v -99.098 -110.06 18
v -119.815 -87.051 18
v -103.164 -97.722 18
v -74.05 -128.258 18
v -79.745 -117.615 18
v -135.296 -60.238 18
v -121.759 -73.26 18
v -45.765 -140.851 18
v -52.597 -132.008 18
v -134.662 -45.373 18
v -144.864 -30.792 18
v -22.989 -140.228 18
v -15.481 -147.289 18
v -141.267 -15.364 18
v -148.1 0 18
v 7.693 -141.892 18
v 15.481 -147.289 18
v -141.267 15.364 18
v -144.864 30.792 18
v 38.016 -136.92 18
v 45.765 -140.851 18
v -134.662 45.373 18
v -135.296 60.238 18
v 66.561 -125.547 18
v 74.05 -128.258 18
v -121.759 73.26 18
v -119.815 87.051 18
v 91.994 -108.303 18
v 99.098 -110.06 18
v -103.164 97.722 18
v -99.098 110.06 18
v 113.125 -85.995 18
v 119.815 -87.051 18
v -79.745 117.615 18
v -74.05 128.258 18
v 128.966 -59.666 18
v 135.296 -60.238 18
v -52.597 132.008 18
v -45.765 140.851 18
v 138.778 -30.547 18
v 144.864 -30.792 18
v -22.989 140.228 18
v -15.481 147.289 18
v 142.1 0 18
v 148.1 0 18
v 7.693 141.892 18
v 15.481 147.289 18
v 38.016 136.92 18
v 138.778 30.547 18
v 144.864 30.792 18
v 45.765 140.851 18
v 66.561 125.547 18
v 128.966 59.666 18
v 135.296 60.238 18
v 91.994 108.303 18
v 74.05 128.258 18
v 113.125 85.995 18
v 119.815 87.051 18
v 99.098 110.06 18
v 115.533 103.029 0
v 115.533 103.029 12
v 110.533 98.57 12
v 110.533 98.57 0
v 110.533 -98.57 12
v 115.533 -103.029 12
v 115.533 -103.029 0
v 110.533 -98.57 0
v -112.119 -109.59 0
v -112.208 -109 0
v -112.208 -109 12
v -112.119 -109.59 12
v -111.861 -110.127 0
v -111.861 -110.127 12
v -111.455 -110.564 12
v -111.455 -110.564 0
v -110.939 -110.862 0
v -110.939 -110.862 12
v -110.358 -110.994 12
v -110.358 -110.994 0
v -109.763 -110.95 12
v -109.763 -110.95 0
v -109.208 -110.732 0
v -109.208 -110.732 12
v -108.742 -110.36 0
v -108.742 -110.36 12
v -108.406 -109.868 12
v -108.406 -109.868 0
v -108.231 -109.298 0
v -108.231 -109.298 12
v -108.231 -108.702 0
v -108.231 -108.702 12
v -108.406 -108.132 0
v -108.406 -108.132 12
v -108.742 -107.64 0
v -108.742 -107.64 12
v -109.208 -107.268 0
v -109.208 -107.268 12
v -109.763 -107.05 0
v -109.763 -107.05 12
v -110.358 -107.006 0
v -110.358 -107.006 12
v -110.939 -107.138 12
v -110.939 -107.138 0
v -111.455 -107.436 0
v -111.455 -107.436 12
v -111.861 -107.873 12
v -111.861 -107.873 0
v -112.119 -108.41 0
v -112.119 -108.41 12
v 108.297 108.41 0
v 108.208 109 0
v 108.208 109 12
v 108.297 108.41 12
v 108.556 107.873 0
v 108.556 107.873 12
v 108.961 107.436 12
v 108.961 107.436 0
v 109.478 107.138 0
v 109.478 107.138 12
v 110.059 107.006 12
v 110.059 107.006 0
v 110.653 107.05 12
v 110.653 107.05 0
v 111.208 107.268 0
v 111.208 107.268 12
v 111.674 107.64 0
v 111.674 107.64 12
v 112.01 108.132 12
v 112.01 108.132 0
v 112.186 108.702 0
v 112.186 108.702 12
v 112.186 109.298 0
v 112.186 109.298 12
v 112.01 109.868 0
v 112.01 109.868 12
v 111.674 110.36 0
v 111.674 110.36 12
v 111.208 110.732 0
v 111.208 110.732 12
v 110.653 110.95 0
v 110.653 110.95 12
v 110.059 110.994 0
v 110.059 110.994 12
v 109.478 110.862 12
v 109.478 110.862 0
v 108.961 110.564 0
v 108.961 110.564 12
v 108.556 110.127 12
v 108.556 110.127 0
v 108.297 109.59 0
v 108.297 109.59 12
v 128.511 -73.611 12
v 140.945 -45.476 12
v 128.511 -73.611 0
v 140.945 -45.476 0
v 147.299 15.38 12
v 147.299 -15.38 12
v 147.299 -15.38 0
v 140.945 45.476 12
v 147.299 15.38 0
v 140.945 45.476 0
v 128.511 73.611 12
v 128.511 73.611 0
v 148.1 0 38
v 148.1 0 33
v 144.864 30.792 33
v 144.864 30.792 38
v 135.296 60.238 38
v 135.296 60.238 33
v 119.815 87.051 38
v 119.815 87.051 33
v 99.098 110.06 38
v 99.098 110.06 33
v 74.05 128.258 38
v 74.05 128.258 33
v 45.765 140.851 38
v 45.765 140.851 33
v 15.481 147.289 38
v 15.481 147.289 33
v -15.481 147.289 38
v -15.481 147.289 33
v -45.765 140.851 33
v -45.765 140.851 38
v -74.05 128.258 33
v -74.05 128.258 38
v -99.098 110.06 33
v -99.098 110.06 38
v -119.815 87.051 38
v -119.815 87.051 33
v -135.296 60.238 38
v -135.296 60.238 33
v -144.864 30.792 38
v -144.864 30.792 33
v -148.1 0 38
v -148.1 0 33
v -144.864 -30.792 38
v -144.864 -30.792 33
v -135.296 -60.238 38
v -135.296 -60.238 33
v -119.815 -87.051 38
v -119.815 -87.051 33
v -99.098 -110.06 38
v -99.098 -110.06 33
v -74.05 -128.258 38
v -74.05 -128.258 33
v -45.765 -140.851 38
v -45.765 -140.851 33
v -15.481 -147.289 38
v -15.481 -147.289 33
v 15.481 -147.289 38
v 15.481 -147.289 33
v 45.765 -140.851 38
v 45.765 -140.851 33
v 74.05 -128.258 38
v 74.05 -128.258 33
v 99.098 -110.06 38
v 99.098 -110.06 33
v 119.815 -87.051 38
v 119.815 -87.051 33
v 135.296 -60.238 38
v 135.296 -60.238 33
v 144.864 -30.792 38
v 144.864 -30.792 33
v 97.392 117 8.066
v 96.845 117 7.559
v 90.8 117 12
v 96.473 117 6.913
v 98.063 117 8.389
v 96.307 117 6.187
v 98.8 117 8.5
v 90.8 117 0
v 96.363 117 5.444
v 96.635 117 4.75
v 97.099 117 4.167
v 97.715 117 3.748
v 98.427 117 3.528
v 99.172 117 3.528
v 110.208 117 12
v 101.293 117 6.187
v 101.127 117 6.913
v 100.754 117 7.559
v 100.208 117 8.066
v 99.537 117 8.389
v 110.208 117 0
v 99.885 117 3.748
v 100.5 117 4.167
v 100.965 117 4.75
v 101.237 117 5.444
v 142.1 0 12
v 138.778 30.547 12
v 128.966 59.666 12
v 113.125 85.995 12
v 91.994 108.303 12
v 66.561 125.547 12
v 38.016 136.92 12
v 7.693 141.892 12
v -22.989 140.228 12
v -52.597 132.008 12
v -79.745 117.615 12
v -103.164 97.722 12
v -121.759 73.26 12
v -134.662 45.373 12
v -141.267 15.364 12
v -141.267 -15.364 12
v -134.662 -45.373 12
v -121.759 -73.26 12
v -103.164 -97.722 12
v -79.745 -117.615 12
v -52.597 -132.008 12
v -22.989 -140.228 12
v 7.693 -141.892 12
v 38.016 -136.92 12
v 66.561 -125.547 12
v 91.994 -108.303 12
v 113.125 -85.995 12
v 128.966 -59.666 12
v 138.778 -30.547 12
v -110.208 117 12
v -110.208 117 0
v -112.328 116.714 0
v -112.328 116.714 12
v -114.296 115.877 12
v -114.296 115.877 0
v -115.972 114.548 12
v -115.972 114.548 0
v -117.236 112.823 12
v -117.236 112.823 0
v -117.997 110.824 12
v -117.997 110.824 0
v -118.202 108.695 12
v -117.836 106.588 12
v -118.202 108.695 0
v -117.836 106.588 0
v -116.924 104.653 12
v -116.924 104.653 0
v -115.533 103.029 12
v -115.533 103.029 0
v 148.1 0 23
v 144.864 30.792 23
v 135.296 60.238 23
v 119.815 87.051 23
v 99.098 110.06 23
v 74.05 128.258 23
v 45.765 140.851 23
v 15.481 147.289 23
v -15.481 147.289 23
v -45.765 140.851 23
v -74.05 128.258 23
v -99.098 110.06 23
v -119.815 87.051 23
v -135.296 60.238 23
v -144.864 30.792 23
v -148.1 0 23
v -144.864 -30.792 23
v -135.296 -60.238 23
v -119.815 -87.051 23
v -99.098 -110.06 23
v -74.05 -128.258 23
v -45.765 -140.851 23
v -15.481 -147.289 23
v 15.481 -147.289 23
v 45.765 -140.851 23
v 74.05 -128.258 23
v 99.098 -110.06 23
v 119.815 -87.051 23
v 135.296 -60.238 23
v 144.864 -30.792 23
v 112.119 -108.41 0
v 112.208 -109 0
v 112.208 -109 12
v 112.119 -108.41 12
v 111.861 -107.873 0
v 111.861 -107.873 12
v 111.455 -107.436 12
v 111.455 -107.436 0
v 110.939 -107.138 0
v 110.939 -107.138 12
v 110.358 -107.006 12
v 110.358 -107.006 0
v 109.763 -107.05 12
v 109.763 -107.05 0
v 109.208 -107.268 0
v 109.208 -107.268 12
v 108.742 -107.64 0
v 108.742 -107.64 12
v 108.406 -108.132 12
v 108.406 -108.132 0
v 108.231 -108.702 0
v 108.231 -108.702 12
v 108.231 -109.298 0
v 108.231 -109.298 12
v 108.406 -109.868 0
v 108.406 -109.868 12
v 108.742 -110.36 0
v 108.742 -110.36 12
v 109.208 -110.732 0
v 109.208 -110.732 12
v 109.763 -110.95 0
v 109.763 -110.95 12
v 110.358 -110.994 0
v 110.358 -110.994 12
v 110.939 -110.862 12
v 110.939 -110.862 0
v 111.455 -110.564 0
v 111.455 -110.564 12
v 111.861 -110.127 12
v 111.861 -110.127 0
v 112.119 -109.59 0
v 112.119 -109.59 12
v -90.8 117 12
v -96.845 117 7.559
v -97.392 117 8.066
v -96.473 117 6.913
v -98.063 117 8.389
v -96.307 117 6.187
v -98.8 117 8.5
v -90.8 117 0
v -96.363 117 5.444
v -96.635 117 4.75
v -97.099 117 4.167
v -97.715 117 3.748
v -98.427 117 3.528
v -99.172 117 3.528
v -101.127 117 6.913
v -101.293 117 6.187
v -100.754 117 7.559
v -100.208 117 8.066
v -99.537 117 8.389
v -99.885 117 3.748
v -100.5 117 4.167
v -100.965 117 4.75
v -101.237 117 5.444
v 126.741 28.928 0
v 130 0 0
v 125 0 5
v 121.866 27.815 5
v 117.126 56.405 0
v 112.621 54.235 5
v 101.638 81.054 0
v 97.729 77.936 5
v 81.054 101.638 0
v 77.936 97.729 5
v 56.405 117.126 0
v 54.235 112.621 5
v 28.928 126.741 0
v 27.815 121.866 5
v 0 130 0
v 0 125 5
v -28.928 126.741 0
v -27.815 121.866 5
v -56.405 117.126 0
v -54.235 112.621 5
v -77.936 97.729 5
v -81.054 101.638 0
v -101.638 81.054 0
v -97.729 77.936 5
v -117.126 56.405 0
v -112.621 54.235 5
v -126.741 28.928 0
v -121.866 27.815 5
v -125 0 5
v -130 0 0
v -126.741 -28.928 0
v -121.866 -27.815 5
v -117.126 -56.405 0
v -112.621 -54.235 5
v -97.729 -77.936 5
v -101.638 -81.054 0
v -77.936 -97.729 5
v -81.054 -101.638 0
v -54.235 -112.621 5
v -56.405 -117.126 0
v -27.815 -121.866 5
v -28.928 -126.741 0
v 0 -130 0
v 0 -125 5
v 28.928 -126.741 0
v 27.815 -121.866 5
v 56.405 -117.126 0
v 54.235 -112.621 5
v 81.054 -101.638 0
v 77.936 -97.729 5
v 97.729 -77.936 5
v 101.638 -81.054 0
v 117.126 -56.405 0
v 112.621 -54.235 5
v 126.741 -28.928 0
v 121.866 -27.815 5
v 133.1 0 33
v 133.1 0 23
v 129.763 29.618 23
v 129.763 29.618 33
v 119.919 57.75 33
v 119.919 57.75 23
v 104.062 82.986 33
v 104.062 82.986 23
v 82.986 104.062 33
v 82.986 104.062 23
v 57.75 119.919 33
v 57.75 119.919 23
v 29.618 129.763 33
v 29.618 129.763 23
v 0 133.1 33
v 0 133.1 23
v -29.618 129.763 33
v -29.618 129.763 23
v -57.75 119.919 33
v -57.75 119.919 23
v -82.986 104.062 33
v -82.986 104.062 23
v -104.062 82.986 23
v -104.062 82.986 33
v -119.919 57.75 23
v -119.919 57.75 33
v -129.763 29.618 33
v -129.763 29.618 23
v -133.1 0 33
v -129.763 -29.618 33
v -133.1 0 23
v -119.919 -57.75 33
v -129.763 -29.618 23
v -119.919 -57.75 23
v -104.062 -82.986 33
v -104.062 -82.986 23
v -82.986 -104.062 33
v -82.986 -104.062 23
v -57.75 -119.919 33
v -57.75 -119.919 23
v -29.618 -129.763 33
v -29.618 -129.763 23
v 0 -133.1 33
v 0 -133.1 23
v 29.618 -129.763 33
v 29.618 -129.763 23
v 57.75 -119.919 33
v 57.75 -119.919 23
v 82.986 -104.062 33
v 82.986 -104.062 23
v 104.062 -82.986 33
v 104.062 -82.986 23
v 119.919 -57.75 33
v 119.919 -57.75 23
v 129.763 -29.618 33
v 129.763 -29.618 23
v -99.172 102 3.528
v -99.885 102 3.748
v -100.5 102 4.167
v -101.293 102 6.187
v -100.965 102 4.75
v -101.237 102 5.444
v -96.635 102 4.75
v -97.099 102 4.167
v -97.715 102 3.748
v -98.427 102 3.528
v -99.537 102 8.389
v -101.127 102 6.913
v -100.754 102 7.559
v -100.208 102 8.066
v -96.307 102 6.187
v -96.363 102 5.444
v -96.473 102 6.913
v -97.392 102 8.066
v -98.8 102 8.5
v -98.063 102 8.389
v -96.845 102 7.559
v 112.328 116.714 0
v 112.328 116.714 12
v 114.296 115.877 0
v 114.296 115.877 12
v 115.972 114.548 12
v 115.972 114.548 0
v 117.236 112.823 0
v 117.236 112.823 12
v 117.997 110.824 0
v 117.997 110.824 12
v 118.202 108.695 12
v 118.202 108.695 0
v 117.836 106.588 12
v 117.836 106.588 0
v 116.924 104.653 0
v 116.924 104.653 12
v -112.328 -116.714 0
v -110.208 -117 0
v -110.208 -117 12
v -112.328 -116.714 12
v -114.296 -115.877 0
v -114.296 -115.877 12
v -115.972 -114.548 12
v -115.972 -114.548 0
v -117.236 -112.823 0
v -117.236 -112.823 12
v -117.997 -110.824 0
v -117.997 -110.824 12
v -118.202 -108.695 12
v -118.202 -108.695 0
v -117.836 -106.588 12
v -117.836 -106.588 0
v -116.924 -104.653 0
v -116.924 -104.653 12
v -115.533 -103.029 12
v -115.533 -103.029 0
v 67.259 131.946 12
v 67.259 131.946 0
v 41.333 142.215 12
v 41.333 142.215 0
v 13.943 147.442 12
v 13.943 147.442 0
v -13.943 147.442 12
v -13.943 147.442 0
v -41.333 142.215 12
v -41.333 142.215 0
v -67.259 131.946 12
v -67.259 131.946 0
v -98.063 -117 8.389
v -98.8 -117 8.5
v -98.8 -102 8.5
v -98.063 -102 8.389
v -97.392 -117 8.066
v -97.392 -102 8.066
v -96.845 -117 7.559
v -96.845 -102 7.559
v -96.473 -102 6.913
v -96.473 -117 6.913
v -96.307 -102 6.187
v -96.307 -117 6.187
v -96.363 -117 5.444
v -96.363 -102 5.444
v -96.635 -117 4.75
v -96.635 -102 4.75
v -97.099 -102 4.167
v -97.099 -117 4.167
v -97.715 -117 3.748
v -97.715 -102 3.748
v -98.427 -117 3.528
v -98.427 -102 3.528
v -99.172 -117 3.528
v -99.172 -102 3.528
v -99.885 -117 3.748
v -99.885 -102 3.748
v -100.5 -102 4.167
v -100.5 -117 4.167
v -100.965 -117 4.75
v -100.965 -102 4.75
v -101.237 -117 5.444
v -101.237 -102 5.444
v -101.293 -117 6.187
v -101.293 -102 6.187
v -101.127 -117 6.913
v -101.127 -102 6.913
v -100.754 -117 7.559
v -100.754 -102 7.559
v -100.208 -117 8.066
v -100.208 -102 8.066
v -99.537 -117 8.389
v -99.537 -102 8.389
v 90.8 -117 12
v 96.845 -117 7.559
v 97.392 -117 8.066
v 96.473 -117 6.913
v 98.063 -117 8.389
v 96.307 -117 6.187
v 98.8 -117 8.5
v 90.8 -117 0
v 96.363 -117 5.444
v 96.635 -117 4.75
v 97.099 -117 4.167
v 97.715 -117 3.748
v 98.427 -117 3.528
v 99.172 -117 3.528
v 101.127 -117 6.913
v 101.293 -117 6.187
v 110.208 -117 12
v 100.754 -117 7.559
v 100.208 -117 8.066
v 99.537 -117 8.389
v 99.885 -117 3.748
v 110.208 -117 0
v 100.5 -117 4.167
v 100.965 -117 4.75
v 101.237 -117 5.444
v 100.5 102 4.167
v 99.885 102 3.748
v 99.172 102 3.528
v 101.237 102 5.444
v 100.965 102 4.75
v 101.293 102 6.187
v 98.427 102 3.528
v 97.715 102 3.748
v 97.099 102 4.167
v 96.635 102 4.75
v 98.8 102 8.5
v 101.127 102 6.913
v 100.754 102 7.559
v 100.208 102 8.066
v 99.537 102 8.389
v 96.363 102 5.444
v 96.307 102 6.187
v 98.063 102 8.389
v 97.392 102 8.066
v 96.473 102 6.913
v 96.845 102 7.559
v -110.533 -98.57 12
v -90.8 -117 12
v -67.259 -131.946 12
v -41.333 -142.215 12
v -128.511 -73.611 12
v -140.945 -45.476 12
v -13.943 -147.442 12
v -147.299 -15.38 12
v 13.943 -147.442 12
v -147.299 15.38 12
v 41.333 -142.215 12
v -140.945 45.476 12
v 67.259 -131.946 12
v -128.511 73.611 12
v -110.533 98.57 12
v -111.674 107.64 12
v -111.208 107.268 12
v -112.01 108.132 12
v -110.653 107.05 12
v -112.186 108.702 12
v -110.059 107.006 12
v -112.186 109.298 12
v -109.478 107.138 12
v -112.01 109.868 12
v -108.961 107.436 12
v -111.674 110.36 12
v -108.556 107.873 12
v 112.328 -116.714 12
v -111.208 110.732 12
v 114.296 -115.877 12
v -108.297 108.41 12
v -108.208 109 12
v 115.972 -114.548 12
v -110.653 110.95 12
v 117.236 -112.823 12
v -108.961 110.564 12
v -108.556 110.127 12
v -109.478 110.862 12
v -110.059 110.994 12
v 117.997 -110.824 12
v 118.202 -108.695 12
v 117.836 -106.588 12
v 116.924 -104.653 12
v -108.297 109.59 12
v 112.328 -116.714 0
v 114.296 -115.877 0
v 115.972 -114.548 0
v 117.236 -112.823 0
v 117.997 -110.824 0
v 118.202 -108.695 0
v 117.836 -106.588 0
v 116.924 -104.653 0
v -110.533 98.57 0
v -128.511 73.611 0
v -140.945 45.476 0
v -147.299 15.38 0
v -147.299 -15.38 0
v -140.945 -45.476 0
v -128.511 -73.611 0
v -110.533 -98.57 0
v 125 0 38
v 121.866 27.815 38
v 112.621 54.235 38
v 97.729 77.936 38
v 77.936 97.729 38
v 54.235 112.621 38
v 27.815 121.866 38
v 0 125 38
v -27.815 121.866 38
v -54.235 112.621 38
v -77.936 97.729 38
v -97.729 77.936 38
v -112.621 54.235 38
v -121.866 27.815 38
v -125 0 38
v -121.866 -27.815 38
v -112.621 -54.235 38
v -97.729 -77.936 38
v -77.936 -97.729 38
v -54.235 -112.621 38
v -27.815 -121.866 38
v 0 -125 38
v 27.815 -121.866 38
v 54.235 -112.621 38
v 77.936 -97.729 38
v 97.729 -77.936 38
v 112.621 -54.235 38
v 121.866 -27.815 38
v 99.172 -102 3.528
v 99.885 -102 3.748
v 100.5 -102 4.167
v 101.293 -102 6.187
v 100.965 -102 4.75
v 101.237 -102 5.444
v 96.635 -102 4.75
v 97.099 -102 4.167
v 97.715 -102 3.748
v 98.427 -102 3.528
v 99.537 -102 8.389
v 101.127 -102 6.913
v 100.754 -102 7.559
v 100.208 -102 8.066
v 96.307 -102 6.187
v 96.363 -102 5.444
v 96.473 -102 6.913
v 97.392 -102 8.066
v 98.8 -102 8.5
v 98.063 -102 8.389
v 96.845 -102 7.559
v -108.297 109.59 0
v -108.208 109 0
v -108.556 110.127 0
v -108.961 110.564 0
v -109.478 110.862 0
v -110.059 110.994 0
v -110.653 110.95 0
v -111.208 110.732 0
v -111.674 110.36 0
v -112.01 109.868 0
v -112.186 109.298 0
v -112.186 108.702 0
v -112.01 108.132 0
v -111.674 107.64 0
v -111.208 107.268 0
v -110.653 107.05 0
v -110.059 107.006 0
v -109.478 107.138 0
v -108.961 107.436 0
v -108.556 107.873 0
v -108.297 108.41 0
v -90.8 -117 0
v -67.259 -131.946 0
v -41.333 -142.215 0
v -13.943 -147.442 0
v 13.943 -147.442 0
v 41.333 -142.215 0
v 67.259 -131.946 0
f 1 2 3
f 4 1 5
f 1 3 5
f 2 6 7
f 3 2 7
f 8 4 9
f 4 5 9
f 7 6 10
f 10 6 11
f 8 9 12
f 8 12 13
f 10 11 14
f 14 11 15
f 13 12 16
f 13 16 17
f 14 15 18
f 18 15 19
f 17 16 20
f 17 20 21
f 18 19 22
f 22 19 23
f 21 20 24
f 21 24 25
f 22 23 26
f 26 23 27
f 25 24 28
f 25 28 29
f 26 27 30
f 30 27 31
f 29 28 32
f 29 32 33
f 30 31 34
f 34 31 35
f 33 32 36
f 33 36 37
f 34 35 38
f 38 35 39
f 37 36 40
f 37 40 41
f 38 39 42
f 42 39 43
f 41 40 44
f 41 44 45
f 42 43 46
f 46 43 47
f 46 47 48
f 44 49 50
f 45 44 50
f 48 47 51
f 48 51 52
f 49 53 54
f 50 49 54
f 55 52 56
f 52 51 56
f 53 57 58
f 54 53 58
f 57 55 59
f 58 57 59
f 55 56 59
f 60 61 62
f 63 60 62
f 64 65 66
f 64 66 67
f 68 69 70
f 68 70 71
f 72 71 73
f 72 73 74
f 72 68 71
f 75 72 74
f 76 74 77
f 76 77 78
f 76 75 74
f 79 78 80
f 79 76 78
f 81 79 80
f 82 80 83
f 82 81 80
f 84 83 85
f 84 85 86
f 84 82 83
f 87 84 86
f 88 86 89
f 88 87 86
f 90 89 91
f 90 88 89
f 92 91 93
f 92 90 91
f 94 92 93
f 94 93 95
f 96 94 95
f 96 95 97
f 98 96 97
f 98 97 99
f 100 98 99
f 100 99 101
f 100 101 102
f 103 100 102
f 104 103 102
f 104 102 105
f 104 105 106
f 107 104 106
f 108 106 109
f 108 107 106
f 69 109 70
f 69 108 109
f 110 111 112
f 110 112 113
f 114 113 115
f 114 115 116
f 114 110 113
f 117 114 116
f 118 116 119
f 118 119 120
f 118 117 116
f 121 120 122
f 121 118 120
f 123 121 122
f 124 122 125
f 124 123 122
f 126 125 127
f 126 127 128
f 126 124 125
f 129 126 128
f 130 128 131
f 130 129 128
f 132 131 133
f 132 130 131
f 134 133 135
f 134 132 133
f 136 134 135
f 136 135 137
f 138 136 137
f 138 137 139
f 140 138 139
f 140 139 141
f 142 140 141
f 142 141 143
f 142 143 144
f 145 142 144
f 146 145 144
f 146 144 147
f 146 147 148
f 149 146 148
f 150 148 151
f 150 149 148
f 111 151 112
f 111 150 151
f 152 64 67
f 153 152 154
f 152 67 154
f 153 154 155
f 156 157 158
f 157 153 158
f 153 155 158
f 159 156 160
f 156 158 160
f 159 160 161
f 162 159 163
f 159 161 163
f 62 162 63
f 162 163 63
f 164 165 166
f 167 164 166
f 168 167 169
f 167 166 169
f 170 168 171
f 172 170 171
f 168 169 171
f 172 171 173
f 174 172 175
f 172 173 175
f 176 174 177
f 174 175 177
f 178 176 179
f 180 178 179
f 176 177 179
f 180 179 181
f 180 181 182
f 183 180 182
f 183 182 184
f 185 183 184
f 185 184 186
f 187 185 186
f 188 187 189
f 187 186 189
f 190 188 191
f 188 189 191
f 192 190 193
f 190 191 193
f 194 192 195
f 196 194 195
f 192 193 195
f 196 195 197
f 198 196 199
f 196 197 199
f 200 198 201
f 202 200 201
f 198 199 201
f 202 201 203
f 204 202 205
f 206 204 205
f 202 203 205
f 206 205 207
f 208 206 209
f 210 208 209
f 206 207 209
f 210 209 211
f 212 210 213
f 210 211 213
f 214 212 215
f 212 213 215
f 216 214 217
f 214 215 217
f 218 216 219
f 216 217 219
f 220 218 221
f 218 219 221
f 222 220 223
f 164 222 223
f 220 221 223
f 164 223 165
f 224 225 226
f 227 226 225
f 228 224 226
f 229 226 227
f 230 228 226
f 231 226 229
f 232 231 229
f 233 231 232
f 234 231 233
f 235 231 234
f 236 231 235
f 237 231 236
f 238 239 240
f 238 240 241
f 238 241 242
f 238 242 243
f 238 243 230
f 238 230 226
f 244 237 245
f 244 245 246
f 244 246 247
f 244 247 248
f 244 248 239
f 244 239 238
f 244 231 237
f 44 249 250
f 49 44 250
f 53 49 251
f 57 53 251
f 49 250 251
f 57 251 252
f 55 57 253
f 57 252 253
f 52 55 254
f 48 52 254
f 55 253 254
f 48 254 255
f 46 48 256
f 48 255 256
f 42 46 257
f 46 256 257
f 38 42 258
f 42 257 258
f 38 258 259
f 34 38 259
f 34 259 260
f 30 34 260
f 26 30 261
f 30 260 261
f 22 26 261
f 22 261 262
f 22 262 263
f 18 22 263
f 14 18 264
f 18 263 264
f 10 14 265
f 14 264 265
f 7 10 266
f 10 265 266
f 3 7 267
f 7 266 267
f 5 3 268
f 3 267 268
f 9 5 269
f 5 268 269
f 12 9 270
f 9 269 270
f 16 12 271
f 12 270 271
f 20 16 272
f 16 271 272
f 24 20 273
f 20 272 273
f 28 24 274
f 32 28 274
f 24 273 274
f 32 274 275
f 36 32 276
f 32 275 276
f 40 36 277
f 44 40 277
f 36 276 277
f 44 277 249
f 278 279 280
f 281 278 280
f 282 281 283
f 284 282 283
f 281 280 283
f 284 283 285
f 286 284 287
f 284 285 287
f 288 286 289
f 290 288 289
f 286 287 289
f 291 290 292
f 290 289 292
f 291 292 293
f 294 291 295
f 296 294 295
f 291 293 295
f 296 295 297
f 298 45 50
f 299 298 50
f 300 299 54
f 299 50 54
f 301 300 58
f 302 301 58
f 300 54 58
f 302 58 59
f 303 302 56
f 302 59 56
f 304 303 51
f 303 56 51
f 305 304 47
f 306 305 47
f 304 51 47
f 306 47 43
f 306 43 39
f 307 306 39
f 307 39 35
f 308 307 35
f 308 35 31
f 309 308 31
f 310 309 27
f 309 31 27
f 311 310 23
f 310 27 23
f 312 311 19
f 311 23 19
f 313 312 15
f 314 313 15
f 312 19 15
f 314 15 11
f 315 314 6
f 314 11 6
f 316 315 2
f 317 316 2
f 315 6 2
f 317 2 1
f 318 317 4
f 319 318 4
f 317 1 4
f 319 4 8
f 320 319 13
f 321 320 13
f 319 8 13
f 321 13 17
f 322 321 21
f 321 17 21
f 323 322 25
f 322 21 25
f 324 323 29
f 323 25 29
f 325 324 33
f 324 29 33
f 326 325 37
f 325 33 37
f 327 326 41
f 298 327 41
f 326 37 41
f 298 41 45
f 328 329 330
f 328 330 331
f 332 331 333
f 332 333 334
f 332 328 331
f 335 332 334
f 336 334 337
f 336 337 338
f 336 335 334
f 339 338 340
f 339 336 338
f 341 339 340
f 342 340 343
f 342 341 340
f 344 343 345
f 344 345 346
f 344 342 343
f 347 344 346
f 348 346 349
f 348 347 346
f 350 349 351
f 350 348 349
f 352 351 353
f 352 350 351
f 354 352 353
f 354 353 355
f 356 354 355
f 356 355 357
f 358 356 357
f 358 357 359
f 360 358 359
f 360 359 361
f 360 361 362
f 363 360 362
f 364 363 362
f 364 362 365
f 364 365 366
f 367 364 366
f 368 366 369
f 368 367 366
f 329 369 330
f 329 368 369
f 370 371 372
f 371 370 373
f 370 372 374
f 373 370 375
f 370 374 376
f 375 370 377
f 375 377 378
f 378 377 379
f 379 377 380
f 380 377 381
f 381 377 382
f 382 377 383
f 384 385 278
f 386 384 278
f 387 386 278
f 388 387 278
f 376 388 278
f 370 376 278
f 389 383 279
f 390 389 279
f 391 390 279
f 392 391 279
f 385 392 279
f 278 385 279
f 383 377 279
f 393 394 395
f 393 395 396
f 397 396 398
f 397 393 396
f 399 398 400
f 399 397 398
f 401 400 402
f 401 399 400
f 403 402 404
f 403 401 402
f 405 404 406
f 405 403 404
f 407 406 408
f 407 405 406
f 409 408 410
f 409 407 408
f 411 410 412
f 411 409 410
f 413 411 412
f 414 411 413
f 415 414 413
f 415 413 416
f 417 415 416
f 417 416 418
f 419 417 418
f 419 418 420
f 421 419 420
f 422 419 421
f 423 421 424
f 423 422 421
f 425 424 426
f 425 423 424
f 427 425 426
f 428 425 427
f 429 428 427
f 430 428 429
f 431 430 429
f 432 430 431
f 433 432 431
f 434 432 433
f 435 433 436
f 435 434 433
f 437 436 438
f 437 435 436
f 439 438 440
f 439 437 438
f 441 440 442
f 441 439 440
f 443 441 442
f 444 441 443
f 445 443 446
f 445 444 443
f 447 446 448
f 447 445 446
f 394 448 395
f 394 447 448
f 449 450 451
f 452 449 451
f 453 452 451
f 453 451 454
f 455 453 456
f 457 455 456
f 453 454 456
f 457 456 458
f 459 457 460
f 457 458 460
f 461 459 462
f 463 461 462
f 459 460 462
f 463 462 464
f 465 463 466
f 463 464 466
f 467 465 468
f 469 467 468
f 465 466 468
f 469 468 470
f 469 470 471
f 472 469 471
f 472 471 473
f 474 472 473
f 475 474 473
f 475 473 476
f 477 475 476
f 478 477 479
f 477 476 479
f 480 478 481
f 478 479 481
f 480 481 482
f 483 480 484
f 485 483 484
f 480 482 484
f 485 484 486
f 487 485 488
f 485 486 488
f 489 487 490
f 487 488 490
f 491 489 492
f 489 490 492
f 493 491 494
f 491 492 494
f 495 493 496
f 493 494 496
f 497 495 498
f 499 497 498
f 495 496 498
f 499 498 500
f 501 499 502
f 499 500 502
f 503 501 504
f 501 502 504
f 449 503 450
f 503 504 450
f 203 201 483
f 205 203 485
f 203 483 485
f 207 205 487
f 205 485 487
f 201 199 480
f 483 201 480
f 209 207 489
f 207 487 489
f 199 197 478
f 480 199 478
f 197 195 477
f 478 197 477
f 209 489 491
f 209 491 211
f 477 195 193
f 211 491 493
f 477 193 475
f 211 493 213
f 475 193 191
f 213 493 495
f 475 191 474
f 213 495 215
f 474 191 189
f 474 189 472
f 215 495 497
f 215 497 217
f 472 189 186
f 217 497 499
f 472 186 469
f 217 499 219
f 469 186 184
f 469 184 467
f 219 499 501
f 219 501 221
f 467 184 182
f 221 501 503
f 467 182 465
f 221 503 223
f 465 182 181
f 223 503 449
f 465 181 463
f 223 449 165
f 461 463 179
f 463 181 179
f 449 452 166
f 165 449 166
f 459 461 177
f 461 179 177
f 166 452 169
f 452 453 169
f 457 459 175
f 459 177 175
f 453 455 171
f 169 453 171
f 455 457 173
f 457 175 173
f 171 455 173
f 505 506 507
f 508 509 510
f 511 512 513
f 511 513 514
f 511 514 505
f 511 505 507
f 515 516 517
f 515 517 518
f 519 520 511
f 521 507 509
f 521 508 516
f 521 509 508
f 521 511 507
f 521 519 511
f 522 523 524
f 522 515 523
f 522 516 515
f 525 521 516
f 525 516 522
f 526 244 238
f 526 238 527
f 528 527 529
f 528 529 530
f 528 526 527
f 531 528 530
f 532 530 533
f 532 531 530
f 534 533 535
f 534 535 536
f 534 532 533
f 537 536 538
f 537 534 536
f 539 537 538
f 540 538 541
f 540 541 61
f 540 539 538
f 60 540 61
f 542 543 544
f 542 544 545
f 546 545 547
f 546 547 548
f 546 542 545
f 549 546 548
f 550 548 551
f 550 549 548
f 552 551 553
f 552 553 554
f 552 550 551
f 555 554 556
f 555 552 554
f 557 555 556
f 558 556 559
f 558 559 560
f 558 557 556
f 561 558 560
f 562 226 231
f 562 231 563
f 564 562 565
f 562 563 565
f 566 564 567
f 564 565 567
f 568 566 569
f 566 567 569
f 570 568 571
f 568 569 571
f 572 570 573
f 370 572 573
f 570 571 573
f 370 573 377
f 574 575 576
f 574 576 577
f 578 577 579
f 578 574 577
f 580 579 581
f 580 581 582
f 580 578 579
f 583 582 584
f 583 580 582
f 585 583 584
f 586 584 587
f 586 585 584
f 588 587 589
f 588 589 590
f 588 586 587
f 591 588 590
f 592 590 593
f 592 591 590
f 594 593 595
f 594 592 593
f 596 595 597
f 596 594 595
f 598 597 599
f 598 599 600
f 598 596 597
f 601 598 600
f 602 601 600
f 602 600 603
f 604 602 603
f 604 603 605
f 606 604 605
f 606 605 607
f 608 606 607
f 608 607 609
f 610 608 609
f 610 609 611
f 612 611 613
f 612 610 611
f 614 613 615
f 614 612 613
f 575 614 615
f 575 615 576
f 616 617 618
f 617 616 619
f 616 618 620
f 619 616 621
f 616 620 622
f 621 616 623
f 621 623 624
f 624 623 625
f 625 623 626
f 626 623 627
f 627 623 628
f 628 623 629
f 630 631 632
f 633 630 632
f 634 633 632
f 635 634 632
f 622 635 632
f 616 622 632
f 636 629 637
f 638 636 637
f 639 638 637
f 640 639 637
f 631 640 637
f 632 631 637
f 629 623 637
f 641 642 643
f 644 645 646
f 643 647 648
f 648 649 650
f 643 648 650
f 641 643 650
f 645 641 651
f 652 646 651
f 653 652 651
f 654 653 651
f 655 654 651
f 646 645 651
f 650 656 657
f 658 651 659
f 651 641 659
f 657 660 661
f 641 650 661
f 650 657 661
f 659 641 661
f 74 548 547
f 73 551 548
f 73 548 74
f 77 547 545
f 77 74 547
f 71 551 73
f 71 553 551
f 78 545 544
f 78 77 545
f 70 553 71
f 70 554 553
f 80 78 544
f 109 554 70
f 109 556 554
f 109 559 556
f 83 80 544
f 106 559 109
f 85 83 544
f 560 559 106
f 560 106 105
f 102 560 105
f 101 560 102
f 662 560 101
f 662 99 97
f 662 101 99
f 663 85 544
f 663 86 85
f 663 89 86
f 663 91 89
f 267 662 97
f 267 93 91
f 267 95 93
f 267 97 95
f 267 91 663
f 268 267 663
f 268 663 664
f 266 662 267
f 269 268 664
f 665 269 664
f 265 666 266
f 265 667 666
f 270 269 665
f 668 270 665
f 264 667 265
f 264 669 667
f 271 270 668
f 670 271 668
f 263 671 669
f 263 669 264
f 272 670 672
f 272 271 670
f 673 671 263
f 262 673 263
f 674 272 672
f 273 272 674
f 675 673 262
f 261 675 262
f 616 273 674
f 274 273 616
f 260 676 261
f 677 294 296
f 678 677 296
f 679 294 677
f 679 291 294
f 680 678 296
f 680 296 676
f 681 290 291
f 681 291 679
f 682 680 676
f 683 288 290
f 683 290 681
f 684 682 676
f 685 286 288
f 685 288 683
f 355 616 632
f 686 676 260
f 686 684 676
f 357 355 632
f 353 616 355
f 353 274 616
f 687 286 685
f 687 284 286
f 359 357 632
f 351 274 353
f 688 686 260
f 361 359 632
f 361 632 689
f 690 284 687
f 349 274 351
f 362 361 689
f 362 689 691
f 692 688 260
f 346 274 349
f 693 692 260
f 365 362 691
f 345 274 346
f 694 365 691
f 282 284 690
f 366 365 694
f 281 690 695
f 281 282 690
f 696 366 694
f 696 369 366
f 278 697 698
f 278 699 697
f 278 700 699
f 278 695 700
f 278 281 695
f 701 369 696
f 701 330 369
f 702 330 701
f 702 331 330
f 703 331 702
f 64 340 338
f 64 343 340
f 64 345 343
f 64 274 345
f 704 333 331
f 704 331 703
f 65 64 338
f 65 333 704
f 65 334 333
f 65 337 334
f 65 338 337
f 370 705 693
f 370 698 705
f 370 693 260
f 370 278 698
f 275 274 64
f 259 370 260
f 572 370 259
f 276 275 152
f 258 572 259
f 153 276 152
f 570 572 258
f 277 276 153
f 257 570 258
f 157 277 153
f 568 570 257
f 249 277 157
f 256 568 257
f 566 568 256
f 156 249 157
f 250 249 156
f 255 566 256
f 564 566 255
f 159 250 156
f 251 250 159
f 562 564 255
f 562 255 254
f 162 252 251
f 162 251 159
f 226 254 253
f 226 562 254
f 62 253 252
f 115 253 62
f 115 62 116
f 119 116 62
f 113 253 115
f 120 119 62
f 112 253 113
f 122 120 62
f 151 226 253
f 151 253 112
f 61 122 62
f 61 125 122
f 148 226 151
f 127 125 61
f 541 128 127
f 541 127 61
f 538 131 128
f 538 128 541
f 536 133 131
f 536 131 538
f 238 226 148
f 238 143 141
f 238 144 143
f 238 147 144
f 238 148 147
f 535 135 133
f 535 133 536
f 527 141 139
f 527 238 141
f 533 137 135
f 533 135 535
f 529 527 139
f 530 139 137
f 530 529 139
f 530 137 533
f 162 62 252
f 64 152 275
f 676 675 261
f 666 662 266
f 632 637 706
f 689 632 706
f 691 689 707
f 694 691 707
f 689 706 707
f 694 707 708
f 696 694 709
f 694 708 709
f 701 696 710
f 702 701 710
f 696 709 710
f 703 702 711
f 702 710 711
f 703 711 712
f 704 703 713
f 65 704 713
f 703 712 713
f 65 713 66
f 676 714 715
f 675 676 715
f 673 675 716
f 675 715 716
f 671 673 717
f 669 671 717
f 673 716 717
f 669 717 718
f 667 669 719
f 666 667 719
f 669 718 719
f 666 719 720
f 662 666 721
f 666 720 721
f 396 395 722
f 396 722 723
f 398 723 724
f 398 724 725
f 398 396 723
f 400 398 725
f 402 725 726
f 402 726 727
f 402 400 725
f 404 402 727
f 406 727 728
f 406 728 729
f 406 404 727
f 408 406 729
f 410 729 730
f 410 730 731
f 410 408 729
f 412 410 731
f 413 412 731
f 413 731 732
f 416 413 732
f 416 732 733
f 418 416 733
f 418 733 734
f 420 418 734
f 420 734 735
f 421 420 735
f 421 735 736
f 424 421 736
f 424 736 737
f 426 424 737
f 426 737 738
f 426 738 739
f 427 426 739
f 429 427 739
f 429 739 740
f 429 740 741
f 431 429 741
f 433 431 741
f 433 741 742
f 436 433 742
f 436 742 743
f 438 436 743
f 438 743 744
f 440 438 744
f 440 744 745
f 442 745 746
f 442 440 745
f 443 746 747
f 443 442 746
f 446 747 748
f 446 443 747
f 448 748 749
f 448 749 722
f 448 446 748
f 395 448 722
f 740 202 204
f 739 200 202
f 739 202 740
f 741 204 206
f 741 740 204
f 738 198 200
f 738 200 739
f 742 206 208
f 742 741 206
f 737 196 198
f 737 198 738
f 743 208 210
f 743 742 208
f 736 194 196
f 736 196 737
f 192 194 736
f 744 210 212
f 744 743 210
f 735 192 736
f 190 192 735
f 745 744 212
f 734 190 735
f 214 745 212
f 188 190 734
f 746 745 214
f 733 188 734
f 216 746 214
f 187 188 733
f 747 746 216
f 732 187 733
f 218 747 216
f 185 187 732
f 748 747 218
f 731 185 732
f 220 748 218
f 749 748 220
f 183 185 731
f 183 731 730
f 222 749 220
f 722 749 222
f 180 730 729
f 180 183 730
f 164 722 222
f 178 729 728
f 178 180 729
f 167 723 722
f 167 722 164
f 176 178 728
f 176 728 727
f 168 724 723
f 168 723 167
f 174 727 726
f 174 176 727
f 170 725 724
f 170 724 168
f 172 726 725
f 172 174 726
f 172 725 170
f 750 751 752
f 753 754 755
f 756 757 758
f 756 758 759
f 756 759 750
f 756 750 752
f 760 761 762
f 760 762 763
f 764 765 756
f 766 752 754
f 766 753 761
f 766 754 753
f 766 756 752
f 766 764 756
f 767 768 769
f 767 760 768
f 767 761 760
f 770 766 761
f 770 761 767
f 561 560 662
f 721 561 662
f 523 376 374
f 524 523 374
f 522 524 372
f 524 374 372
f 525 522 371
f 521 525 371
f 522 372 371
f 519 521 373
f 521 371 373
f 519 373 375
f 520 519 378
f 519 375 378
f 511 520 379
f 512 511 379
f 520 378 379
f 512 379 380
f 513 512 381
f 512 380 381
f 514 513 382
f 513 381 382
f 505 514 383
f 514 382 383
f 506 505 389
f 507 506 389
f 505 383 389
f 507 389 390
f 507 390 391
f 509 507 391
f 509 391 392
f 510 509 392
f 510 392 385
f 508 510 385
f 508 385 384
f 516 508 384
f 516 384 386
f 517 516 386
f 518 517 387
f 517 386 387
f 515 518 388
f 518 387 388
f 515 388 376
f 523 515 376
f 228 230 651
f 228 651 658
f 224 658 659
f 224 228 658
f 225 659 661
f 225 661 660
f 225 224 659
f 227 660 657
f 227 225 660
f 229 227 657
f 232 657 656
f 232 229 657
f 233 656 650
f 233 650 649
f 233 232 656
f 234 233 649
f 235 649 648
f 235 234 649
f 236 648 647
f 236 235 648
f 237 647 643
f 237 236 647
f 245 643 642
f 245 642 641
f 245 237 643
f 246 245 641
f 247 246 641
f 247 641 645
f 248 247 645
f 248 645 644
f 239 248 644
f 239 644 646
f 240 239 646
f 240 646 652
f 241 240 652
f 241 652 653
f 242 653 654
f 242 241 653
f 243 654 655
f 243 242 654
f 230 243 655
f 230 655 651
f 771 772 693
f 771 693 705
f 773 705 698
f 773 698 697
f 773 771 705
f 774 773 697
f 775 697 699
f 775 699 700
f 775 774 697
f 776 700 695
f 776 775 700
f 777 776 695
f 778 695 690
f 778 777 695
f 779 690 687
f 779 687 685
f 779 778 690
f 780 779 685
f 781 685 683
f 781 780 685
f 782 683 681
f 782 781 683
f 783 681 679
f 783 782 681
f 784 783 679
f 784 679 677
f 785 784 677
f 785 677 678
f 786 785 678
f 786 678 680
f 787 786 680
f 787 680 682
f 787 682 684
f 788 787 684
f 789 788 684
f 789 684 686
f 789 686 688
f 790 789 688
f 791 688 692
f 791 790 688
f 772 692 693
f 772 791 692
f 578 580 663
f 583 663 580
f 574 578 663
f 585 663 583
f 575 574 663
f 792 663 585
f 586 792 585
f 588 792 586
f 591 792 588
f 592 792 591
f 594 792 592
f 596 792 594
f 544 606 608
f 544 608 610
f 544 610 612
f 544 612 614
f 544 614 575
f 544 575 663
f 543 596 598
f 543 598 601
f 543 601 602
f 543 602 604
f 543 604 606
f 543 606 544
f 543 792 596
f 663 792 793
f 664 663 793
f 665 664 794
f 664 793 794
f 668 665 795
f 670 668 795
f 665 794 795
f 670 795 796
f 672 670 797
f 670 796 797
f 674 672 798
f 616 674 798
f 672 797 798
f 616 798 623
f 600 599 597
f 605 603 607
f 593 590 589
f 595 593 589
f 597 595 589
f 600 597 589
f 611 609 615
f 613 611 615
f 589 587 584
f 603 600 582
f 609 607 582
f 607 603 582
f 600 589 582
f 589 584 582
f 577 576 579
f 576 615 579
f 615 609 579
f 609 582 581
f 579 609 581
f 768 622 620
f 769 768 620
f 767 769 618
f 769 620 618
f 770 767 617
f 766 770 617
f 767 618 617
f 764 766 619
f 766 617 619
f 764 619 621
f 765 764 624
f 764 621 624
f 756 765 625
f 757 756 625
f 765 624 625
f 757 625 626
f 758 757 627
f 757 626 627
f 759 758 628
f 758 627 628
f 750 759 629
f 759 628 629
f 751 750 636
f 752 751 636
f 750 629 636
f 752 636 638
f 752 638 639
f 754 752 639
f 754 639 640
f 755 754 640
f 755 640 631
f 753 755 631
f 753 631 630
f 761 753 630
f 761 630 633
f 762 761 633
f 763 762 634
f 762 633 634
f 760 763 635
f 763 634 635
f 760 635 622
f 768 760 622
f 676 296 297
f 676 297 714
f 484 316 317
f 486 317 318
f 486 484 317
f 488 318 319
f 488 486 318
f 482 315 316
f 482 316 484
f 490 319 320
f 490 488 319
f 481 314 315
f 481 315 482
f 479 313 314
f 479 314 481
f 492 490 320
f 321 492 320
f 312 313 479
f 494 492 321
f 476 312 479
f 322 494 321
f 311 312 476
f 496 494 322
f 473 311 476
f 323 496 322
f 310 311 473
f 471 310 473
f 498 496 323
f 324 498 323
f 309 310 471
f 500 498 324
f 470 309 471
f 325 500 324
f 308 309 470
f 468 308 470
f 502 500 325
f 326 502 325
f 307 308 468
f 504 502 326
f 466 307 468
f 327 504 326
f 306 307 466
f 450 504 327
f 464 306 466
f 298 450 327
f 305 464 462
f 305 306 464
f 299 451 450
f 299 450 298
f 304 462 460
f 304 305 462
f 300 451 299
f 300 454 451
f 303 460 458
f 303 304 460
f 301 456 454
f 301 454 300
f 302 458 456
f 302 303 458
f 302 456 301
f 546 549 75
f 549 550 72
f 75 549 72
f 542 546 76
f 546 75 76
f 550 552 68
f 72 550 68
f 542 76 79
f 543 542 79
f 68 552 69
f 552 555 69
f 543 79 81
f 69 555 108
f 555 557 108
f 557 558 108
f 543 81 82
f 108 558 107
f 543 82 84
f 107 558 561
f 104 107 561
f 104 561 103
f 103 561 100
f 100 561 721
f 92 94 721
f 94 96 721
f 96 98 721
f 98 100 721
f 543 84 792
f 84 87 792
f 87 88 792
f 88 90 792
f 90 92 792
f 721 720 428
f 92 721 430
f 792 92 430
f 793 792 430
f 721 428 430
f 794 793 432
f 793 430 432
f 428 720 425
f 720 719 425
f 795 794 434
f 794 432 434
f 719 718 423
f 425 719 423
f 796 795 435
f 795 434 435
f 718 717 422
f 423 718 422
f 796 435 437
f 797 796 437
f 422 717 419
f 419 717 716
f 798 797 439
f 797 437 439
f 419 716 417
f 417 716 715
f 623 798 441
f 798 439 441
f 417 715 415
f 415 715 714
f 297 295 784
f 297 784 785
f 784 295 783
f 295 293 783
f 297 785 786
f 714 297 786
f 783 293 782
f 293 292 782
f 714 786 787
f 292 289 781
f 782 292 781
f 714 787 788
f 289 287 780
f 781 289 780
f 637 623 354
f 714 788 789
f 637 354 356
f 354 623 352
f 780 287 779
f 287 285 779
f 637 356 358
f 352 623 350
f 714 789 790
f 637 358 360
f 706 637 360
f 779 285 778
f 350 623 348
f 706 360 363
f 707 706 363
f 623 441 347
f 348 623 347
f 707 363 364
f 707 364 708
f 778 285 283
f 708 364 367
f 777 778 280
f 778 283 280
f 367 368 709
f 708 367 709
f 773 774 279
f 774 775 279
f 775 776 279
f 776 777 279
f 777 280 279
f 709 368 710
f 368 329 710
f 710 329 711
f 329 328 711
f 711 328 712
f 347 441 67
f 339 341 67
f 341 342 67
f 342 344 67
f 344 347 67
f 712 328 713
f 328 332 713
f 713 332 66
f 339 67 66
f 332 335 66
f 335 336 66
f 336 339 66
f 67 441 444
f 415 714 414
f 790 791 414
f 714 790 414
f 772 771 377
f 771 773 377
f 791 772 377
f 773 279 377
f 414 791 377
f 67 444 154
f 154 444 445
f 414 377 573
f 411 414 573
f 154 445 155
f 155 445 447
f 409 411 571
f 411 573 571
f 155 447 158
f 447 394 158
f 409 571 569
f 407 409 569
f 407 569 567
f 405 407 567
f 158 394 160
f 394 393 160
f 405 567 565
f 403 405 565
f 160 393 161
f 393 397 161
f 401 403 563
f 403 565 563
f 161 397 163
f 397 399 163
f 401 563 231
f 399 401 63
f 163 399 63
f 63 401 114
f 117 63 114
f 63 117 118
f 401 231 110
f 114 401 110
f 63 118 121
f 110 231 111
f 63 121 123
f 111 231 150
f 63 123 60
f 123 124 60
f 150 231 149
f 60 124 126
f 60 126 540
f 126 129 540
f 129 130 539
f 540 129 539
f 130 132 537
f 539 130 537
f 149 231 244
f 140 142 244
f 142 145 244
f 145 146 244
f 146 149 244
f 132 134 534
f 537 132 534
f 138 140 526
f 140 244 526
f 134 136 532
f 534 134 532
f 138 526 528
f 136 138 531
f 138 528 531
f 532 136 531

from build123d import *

# Parameters (mm, degrees)
SKETCH_1_R               = 148.1
SKETCH_1_R_2             = 125
EXTRUDE_1_DEPTH          = 12
SKETCH_2_R               = 142.1
SKETCH_2_R_2             = 125
EXTRUDE_2_DEPTH          = 6
SKETCH_3_R               = 148.1
SKETCH_3_R_2             = 125
EXTRUDE_3_DEPTH          = 5
SKETCH_4_R               = 133.1
SKETCH_4_R_2             = 125
EXTRUDE_4_DEPTH          = 10
SKETCH_5_R               = 148.1
SKETCH_5_R_2             = 125
EXTRUDE_5_DEPTH          = 5
SKETCH_6_R               = 2
EXTRUDE_6_DEPTH          = 12
SKETCH_7_R               = 2.5
CUT_EXTRUDE_1_DEPTH      = 15
MIRROR_2_COPY_1_SKETCH_R = 2.5
MIRROR_2_COPY_1_DEPTH    = 15
CHAMFER_1_SIZE           = 5


with BuildPart() as part:
    # 草图1 → 凸台-拉伸1 (new body)
    with BuildSketch(Plane.XY):
        Circle(SKETCH_1_R)
        Circle(SKETCH_1_R_2, mode=Mode.SUBTRACT)
    extrude(amount=EXTRUDE_1_DEPTH)

    # 草图2 → 凸台-拉伸2 (add)
    with BuildSketch(Plane.XY.offset(12)):
        Circle(SKETCH_2_R)
        Circle(SKETCH_2_R_2, mode=Mode.SUBTRACT)
    extrude(amount=EXTRUDE_2_DEPTH)

    # 草图3 → 凸台-拉伸3 (add)
    with BuildSketch(Plane.XY.offset(18)):
        Circle(SKETCH_3_R)
        Circle(SKETCH_3_R_2, mode=Mode.SUBTRACT)
    extrude(amount=EXTRUDE_3_DEPTH)

    # 草图4 → 凸台-拉伸4 (add)
    with BuildSketch(Plane.XY.offset(23)):
        Circle(SKETCH_4_R)
        Circle(SKETCH_4_R_2, mode=Mode.SUBTRACT)
    extrude(amount=EXTRUDE_4_DEPTH)

    # 草图5 → 凸台-拉伸5 (add)
    with BuildSketch(Plane.XY.offset(33)):
        Circle(SKETCH_5_R)
        Circle(SKETCH_5_R_2, mode=Mode.SUBTRACT)
    extrude(amount=EXTRUDE_5_DEPTH)

    # 草图6 → 凸台-拉伸6 (add)
    # profile 1 of 4: a face of its own
    with BuildSketch(Plane.XY):
        with BuildLine():
            Line((-90.799834802, 117), (-110.208193805, 117))
            ThreePointArc((-110.208193805, 117), (-117.683675787, 111.849064607), (-115.532726589, 103.029292284))
            Line((-115.532726589, 103.029292284), (-110.532726589, 98.570413171))
            ThreePointArc((-110.532726589, 98.570413171), (-101.087152926, 108.235842092), (-90.799834802, 117))
        make_face()
        with Locations((-110.208193805, 109)):
            Circle(SKETCH_6_R, mode=Mode.SUBTRACT)
    # profile 2 of 4: a face of its own
    with BuildSketch(Plane.XY):
        with BuildLine():
            Line((115.532726589, 103.029292284), (110.532726589, 98.570413171))
            ThreePointArc((110.532726589, 98.570413171), (101.087152926, 108.235842092), (90.799834802, 117))
            Line((90.799834802, 117), (110.208193805, 117))
            ThreePointArc((110.208193805, 117), (117.683675787, 111.849064607), (115.532726589, 103.029292284))
        make_face()
        with Locations(Location((110.208193805, 109, 0), (0, 0, 180))):
            Circle(SKETCH_6_R, mode=Mode.SUBTRACT)
    # profile 3 of 4: a face of its own
    with BuildSketch(Plane.XY):
        with BuildLine():
            Line((115.532726589, -103.029292284), (110.532726589, -98.570413171))
            ThreePointArc((110.532726589, -98.570413171), (101.087152926, -108.235842092), (90.799834802, -117))
            Line((90.799834802, -117), (110.208193805, -117))
            ThreePointArc((110.208193805, -117), (117.683675787, -111.849064607), (115.532726589, -103.029292284))
        make_face()
        with Locations((110.208193805, -109)):
            Circle(SKETCH_6_R, mode=Mode.SUBTRACT)
    # profile 4 of 4: a face of its own
    with BuildSketch(Plane.XY):
        with BuildLine():
            Line((-115.532726589, -103.029292284), (-110.532726589, -98.570413171))
            ThreePointArc((-110.532726589, -98.570413171), (-101.087152926, -108.235842092), (-90.799834802, -117))
            Line((-90.799834802, -117), (-110.208193805, -117))
            ThreePointArc((-110.208193805, -117), (-117.683675787, -111.849064607), (-115.532726589, -103.029292284))
        make_face()
        with Locations(Location((-110.208193805, -109, 0), (0, 0, 180))):
            Circle(SKETCH_6_R, mode=Mode.SUBTRACT)
    extrude(amount=EXTRUDE_6_DEPTH)

    # 草图7 → 切除-拉伸1 (cut)
    with BuildSketch(Plane(origin=(0, 117, 0), x_dir=(1, 0, 0), z_dir=(0, 1, 0))):
        with Locations(Location((-98.799834802, -6, 0), (0, 0, 270))):
            Circle(SKETCH_7_R)
    cut_extrude_1 = extrude(amount=-CUT_EXTRUDE_1_DEPTH, mode=Mode.SUBTRACT)

    # 镜向1: 切除-拉伸1 across plane
    add(cut_extrude_1.mirror(Plane(origin=(0, 0, 0), x_dir=(0, 0, 1), z_dir=(1, 0, 0))), mode=Mode.SUBTRACT)

    # 镜向2: 切除-拉伸1 across plane
    add(cut_extrude_1.mirror(Plane.ZX), mode=Mode.SUBTRACT)

    # 镜向2 copy 1 sketch → 镜向2 copy 1 (cut)
    with BuildSketch(Plane(origin=(0, -117, 0), x_dir=(-1, 0, 0), z_dir=(0, -1, 0))):
        with Locations(Location((-98.799834802, -6, 0), (0, 0, 270))):
            Circle(MIRROR_2_COPY_1_SKETCH_R)
    extrude(amount=-MIRROR_2_COPY_1_DEPTH, mode=Mode.SUBTRACT)

    # 倒角1
    chamfer_1_edges = [part.edges().sort_by_distance(p)[0] for p in [
        (-125, 0, 0),
    ]]
    chamfer(chamfer_1_edges, length=CHAMFER_1_SIZE)


solid = part.part
